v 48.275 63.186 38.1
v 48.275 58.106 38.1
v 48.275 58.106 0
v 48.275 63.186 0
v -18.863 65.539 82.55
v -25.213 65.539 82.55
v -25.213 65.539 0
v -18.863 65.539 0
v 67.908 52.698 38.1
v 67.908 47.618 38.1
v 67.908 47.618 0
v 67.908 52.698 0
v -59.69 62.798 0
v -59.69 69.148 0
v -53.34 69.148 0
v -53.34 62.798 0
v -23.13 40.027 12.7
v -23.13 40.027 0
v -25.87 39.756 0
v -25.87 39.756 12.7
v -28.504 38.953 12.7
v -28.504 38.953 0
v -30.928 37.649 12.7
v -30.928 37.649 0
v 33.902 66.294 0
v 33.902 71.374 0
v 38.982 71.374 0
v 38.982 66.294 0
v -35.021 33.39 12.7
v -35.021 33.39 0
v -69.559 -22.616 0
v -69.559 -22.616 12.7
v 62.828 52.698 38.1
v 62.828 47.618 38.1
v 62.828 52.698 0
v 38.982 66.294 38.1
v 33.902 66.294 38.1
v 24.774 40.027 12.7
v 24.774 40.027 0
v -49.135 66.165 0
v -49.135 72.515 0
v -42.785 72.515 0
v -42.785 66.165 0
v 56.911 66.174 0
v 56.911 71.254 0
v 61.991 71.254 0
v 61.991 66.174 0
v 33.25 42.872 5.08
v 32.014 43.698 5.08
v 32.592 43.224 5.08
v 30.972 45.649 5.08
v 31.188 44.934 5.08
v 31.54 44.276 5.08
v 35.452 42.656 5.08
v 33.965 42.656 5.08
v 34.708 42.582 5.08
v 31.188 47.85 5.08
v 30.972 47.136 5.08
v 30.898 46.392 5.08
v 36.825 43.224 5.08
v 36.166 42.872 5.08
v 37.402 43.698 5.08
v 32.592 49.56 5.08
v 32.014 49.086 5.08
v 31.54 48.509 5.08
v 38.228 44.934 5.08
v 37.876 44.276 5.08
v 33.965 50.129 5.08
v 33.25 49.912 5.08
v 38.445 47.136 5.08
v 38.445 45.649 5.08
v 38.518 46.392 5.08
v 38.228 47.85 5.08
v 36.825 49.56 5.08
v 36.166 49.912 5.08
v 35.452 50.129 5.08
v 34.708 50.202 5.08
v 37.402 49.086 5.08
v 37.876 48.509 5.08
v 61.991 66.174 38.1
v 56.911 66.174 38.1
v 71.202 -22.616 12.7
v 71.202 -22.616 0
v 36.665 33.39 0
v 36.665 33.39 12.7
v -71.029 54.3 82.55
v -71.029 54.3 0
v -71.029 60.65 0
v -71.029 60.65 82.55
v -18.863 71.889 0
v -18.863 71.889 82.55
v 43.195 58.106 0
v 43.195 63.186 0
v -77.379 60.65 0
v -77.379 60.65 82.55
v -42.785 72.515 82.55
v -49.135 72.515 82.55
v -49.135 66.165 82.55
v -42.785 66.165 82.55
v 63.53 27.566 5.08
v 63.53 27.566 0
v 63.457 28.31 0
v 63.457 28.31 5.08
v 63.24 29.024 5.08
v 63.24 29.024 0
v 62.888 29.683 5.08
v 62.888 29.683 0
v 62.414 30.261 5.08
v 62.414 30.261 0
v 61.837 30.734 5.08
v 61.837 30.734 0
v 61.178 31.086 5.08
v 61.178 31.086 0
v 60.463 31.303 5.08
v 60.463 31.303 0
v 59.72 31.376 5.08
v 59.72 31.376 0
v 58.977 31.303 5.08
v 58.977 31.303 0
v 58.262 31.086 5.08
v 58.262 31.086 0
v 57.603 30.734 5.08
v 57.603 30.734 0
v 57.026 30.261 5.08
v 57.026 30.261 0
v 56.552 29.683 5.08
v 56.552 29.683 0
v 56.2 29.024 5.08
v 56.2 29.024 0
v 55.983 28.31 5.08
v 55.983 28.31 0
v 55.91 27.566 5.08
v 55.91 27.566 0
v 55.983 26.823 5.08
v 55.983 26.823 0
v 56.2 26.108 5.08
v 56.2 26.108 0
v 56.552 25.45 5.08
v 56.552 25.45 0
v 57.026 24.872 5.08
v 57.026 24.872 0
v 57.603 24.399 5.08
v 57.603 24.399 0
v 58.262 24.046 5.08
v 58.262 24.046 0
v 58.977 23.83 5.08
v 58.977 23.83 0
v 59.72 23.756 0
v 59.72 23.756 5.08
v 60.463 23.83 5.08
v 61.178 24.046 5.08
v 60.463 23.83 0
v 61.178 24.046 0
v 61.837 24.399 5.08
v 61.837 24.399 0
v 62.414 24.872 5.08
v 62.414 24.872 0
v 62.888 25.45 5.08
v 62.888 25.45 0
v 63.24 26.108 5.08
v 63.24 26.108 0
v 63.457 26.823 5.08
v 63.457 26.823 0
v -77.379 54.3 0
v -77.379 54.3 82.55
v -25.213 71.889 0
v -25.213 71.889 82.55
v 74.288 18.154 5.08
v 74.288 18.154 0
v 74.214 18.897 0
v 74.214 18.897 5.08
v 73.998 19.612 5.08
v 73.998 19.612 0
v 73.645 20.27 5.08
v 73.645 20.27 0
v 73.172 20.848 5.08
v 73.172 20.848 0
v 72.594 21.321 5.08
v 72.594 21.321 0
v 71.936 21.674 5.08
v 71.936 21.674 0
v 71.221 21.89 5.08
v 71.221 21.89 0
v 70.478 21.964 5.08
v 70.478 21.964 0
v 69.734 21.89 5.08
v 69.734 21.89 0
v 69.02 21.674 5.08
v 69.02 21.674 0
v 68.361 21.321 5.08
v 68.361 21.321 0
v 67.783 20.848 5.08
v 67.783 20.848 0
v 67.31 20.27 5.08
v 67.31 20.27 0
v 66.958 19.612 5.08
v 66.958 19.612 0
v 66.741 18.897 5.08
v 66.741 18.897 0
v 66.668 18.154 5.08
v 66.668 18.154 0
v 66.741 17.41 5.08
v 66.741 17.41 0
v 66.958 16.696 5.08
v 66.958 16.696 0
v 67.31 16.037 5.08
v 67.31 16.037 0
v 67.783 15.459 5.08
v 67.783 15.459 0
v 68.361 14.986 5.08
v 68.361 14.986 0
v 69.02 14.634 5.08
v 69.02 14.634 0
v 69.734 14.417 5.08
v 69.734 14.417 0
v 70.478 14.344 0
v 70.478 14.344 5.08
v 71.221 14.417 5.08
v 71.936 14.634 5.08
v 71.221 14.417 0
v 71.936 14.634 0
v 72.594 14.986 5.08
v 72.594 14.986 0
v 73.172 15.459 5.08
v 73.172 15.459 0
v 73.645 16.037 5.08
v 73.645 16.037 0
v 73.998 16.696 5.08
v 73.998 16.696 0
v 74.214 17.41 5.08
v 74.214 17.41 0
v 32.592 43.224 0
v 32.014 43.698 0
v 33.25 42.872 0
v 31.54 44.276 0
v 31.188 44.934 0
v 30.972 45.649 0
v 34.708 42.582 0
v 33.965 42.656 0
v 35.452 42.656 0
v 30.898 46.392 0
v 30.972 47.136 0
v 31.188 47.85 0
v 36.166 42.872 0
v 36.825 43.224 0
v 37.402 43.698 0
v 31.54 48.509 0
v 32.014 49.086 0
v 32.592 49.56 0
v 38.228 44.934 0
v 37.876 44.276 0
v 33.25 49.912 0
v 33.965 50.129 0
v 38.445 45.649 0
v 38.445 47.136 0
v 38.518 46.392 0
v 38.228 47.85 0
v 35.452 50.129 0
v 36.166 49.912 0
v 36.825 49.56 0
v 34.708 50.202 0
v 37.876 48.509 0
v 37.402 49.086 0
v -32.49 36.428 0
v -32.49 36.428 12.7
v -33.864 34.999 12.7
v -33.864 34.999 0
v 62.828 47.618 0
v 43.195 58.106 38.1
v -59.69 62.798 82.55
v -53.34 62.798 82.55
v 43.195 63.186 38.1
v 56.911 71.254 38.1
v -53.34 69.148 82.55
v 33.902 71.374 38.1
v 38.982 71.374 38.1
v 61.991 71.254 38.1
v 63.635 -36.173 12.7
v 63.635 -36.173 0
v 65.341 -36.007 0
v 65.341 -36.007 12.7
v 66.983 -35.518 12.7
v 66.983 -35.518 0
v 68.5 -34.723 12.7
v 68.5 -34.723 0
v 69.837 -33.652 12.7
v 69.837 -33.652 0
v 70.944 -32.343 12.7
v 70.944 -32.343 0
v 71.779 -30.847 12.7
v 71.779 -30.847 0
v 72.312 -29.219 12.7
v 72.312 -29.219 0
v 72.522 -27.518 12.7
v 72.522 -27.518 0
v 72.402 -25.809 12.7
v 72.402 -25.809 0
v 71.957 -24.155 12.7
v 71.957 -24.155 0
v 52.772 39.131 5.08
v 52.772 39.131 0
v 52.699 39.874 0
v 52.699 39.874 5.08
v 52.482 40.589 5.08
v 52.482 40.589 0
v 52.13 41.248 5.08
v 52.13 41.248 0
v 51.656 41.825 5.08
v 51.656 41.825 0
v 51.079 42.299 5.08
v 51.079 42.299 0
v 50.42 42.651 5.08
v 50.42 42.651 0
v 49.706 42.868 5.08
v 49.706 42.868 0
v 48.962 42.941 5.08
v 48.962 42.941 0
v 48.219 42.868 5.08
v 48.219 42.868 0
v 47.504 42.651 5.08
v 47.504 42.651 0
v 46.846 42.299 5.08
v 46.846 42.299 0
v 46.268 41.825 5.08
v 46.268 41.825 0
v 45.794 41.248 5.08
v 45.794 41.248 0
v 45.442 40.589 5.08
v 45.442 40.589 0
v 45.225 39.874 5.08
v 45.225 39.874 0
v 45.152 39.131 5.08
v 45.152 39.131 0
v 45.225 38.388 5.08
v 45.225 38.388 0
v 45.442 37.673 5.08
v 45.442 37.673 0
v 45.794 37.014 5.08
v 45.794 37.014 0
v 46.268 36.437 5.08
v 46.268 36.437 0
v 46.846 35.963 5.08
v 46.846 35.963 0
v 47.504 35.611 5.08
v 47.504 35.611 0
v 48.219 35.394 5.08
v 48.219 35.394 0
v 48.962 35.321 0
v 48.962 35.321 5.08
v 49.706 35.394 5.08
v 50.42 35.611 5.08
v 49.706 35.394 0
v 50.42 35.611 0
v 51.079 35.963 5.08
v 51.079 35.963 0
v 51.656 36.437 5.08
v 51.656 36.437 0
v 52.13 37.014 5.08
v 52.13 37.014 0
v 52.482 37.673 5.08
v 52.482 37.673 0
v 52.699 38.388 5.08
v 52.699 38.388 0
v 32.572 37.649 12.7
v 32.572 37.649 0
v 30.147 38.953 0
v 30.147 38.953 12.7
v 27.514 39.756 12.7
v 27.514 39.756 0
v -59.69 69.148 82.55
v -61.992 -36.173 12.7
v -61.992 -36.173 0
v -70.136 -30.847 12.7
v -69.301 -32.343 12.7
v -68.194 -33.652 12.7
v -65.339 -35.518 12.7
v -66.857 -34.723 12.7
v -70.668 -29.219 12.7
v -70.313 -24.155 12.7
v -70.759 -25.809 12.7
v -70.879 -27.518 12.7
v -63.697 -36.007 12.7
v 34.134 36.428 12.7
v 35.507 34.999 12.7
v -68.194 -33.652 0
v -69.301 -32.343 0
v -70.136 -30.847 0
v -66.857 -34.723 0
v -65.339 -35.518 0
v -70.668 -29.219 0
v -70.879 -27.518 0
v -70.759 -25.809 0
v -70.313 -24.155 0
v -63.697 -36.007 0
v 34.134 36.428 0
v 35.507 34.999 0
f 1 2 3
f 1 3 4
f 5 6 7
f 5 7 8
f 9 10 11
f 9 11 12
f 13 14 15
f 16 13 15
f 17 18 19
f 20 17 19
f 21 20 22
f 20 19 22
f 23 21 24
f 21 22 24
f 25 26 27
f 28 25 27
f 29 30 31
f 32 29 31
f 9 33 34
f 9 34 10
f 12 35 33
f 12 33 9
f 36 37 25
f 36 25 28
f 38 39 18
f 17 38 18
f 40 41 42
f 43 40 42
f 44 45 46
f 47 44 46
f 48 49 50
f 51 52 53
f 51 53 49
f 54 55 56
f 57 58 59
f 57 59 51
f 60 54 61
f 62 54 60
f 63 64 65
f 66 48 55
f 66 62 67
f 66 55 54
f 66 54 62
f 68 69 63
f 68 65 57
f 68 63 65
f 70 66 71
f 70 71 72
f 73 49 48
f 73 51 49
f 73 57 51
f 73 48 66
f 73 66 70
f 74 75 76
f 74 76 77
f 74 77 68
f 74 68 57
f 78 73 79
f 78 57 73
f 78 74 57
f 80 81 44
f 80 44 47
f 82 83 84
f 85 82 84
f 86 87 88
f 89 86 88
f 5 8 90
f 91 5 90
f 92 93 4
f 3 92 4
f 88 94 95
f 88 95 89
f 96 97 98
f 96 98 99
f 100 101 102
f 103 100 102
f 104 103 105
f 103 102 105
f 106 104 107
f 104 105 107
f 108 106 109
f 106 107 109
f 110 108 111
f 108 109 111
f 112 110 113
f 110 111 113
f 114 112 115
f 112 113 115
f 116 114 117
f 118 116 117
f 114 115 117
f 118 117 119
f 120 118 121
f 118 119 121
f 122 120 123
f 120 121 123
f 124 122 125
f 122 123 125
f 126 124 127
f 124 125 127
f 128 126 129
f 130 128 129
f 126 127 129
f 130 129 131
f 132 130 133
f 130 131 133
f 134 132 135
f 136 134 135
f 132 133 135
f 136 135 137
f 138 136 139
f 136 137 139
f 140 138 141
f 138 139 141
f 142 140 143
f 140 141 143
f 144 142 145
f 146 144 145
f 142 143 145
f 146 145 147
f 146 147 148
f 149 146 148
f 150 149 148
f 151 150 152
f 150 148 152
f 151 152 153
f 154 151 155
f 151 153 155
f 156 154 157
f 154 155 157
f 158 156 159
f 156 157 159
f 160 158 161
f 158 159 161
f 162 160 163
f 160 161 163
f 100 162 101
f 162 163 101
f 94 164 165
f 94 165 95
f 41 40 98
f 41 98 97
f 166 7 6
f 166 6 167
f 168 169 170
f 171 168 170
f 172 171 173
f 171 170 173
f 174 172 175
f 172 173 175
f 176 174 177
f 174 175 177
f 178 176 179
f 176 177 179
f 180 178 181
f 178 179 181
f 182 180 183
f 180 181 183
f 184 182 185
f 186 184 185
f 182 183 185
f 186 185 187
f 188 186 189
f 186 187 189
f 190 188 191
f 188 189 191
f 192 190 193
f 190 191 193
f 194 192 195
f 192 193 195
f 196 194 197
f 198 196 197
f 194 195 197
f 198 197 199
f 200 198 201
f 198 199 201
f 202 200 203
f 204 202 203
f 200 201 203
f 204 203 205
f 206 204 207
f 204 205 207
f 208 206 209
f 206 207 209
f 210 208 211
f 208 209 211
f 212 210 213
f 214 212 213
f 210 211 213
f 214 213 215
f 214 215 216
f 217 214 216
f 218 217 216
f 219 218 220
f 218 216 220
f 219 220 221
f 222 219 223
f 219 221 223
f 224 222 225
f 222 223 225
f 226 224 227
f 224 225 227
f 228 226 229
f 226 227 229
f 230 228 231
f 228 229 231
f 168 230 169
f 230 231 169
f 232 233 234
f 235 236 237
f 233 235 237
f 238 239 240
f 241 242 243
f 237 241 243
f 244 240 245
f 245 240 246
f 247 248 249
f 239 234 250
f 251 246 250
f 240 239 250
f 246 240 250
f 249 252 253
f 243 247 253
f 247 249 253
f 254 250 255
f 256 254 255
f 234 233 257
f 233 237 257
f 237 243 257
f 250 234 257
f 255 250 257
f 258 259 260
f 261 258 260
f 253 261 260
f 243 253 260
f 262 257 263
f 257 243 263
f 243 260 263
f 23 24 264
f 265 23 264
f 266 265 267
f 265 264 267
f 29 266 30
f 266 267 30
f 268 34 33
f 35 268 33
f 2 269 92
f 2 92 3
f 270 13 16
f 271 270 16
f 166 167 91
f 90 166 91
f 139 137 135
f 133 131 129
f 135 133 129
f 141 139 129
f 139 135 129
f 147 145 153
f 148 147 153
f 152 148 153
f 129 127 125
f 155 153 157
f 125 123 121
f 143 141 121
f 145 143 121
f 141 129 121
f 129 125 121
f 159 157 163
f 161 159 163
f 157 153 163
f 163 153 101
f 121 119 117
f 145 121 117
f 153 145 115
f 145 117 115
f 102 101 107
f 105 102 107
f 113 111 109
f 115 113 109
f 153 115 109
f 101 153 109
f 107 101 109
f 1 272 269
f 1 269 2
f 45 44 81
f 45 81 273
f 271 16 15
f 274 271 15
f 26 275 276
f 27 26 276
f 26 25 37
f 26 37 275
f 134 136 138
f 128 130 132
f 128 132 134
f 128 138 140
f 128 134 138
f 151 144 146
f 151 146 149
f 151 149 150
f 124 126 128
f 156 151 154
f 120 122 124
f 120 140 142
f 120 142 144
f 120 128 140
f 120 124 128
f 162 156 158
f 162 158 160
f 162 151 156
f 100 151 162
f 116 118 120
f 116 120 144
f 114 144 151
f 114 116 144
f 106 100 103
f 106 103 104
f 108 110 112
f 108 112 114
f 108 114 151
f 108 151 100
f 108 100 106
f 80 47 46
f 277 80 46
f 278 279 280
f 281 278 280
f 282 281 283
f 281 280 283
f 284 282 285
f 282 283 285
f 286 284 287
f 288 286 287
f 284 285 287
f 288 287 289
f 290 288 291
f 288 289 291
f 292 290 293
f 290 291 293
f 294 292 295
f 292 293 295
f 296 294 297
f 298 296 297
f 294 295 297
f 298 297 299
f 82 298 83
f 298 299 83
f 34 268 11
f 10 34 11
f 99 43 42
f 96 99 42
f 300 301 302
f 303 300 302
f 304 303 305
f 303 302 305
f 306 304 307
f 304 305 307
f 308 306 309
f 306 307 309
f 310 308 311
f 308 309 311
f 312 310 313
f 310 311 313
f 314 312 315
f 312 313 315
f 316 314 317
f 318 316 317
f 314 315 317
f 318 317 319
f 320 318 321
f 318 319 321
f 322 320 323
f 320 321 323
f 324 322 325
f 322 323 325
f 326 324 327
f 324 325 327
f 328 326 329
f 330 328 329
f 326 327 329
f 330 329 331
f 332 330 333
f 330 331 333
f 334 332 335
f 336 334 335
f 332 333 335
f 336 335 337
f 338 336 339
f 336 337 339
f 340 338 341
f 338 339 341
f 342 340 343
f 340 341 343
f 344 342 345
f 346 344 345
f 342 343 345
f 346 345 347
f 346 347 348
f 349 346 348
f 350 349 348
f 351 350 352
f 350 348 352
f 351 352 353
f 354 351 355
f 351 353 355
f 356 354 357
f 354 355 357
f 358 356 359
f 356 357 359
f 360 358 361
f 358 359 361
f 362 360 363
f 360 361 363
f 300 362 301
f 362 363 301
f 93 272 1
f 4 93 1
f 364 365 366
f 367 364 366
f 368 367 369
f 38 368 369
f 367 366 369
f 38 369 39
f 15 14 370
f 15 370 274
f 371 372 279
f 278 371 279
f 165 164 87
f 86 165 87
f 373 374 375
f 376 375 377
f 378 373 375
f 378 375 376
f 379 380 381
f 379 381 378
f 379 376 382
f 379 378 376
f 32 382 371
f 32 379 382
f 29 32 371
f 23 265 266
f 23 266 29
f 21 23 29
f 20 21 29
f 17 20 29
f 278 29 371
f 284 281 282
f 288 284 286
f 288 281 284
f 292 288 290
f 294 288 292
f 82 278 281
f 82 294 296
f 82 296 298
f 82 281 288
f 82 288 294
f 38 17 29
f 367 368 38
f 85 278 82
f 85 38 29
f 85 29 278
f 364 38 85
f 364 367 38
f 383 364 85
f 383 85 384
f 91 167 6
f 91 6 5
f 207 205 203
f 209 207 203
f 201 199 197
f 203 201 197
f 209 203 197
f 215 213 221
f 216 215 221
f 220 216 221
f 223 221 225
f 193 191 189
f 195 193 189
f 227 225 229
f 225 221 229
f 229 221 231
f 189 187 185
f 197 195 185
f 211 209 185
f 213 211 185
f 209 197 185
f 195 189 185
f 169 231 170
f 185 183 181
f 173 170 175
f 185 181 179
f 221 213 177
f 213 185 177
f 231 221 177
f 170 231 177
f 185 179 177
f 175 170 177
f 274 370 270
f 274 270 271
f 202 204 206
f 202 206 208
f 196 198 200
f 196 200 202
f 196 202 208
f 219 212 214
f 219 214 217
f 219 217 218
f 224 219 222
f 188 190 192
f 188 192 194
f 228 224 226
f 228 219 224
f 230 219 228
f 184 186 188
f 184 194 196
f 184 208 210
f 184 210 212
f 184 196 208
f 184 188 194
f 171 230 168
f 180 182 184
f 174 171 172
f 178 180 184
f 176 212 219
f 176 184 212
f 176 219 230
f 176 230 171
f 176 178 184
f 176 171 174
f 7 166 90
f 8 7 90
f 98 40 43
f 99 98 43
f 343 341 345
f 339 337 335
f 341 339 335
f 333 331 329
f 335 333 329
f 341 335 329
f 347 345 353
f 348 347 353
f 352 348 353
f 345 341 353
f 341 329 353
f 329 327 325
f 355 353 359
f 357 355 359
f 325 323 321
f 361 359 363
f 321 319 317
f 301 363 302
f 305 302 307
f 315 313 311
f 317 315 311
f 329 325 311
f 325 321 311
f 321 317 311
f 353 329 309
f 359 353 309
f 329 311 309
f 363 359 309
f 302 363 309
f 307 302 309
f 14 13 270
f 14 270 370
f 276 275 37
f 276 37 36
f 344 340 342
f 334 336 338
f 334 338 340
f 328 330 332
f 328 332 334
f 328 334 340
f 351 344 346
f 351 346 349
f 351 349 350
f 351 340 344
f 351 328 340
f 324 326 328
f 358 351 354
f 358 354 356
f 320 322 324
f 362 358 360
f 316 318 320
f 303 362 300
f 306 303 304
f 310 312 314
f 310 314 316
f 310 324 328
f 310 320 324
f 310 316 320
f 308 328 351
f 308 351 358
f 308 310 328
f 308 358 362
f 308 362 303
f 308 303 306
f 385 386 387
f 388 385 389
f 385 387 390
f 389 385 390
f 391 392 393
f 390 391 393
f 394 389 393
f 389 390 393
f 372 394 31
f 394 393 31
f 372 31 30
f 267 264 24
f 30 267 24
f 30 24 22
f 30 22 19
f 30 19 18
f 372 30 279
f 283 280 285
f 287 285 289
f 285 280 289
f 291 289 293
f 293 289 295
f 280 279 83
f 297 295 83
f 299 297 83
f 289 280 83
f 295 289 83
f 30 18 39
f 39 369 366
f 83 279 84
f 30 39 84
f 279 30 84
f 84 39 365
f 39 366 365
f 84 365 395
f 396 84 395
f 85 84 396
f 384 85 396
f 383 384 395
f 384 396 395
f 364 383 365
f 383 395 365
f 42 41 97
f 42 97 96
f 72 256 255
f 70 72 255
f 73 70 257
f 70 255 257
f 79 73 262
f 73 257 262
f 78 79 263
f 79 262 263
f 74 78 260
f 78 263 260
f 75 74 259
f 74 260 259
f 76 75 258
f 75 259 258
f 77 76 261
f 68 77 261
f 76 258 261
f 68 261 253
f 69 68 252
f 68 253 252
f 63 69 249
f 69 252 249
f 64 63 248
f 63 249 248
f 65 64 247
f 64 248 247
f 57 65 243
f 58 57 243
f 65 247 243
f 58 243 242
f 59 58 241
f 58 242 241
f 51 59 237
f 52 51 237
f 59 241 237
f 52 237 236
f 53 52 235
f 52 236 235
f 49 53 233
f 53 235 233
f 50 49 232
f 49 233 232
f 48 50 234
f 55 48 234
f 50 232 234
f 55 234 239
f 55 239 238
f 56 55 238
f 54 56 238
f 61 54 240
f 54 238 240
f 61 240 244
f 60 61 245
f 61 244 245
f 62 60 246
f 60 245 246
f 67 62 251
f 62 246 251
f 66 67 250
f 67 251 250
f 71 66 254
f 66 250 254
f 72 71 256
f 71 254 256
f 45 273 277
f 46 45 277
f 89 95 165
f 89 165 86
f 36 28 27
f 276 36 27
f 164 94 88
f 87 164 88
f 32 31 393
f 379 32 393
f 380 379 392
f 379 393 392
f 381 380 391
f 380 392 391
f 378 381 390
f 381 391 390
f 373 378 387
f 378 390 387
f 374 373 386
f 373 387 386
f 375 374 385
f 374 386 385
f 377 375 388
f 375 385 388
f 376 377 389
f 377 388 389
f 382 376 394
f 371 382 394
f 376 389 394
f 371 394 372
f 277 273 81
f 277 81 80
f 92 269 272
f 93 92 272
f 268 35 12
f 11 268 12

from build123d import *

# Parameters (mm, degrees)
F1_DEPTH = 12.7
F2_W     = 6.35
F2_H     = 6.35
F3_DEPTH = 82.55
F4_W     = 5.08
F4_H     = 5.08
F5_DEPTH = 38.1
F6_R     = 3.81
F7_DEPTH = 5.08


with BuildPart() as f1:
    # F0 (on Top) → F1 (new body)
    with BuildSketch(Plane.XY):
        with BuildLine():
            Line((24.77391, 40.027413), (-23.130385, 40.027413))
            ThreePointArc((-23.130385, 40.027413), (-27.206704, 39.419468), (-30.928238, 37.648547))
            Line((-30.928238, 37.648547), (-30.928238, -36.172587))
            Line((-30.928238, -36.172587), (32.571762, -36.172587))
            Line((32.571762, -36.172587), (32.571762, 37.648547))
            ThreePointArc((32.571762, 37.648547), (28.850229, 39.419468), (24.77391, 40.027413))
        make_face()
        with BuildLine():
            Line((-30.928238, -36.172587), (-30.928238, 37.648547))
            ThreePointArc((-30.928238, 37.648547), (-33.202371, 35.738116), (-35.021242, 33.390108))
            Line((-35.021242, 33.390108), (-69.558544, -22.616326))
            ThreePointArc((-69.558544, -22.616326), (-69.75421, -31.615545), (-61.991635, -36.172587))
            Line((-61.991635, -36.172587), (-30.928238, -36.172587))
        make_face()
        with BuildLine():
            ThreePointArc((36.664767, 33.390108), (34.845896, 35.738116), (32.571762, 37.648547))
            Line((32.571762, 37.648547), (32.571762, -36.172587))
            Line((32.571762, -36.172587), (63.635159, -36.172587))
            ThreePointArc((63.635159, -36.172587), (71.397735, -31.615545), (71.202068, -22.616326))
            Line((71.202068, -22.616326), (36.664767, 33.390108))
        make_face()
    extrude(amount=F1_DEPTH)


with BuildPart() as f3:
    # F2 (on Top) → F3 (new body)
    with BuildSketch(Plane.XY):
        with Locations((-56.515002, 65.97277)):
            Rectangle(F2_W, F2_H)
        with Locations((-45.959663, 69.340013)):
            Rectangle(F2_W, F2_H)
        with Locations((-74.204132, 57.475317)):
            Rectangle(F2_W, F2_H)
        with Locations((-22.038238, 68.71447)):
            Rectangle(F2_W, F2_H)
    extrude(amount=F3_DEPTH)


with BuildPart() as f5:
    # F4 (on Top) → F5 (new body)
    with BuildSketch(Plane.XY):
        with Locations((36.441528, 68.834)):
            Rectangle(F4_W, F4_H)
        with Locations((59.450939, 68.71447)):
            Rectangle(F4_W, F4_H)
        with Locations((45.734938, 60.646236)):
            Rectangle(F4_W, F4_H)
        with Locations((65.367639, 50.157532)):
            Rectangle(F4_W, F4_H)
    extrude(amount=F5_DEPTH)


with BuildPart() as f7:
    # F6 (on Top) → F7 (new body)
    with BuildSketch(Plane.XY):
        with Locations((34.708351, 46.392355)):
            Circle(F6_R)
        with Locations((48.962232, 39.130941)):
            Circle(F6_R)
        with Locations((59.719883, 27.566472)):
            Circle(F6_R)
        with Locations((70.47753, 18.15353)):
            Circle(F6_R)
    extrude(amount=F7_DEPTH)


solid = Compound([f1.part, f3.part, f5.part, f7.part])
